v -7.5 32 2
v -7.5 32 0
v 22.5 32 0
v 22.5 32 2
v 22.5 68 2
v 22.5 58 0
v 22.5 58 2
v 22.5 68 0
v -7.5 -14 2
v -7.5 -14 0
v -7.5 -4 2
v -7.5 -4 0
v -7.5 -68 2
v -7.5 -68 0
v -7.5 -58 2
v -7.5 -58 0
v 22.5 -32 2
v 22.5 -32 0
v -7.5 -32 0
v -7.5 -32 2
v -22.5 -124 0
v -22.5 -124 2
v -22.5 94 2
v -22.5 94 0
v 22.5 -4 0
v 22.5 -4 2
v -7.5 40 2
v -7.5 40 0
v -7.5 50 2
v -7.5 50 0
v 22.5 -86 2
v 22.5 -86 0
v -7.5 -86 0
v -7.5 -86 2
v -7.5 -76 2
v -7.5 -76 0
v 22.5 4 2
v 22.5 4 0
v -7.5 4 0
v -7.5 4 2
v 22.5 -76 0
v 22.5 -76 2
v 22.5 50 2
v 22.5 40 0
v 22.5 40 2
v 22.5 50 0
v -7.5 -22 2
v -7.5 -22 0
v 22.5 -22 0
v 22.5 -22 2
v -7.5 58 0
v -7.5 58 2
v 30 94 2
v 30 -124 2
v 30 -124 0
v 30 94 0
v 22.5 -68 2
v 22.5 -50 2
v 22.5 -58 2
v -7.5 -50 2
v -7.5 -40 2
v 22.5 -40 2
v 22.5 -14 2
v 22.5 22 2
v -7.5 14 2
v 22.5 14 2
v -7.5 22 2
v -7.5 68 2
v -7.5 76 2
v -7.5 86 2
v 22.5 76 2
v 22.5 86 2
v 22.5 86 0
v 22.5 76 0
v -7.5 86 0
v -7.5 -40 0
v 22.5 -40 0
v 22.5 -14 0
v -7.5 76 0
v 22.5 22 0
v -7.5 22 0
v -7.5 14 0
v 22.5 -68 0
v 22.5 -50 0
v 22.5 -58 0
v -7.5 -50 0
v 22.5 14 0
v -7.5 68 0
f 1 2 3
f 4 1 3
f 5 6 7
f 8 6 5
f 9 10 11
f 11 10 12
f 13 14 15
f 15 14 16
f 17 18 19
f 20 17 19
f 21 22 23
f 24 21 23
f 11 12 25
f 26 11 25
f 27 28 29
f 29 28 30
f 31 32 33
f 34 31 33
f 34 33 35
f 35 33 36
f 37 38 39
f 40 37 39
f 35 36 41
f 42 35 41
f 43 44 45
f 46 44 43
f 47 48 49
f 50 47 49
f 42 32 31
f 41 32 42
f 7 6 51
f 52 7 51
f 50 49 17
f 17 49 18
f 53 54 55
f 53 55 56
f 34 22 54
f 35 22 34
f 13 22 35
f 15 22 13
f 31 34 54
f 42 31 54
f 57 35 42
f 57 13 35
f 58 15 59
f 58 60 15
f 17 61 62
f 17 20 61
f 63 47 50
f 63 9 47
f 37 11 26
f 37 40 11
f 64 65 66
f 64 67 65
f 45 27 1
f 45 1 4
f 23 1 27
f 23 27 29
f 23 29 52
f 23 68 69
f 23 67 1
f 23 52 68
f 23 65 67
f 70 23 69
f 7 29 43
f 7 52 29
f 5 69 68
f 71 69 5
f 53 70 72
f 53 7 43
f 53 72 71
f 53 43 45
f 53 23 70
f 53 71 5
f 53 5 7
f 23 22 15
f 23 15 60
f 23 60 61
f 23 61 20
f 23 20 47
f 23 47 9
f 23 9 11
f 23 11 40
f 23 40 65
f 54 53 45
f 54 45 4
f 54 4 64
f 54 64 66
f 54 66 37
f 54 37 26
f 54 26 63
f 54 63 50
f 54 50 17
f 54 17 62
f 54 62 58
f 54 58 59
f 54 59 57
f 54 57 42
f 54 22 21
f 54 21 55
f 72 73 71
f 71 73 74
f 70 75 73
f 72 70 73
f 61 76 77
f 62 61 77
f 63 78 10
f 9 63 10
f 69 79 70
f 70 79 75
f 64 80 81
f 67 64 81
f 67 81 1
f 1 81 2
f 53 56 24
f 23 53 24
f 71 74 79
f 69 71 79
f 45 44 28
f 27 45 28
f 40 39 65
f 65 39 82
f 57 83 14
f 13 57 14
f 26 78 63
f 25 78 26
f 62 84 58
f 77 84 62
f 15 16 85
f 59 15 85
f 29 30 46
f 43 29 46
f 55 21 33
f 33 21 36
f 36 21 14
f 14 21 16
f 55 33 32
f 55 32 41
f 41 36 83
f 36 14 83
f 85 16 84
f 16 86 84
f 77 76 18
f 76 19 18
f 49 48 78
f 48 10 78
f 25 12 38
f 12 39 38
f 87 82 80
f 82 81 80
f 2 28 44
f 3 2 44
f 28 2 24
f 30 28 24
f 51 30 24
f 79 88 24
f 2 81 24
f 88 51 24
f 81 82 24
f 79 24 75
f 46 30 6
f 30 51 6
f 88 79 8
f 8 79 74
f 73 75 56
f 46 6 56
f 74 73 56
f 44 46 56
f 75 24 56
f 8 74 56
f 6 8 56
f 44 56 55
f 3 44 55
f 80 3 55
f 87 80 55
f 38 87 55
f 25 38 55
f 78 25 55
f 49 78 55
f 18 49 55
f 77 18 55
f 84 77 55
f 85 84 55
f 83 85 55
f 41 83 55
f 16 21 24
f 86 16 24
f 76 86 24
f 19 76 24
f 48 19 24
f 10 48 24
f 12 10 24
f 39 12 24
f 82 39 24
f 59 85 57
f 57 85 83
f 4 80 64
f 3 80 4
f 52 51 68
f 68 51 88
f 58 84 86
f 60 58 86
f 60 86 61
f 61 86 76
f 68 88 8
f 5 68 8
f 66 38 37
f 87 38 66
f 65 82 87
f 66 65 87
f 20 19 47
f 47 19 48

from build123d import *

# Parameters (mm, degrees)
SKETCH2_W           = 15
SKETCH2_H           = 8
SKETCH2_W_2         = 30
SKETCH2_W_3         = 7.5
SKETCH2_H_2         = 10
BOSS_EXTRUDE1_DEPTH = 2
SKETCH3_W           = 52.5
SKETCH3_H           = 30
BOSS_EXTRUDE2_DEPTH = 2


with BuildPart() as part:
    # Sketch2 → Boss-Extrude1 (new body)
    with BuildSketch(Plane.XY):
        with Locations((-15, 90)):
            Rectangle(SKETCH2_W, SKETCH2_H)
        with Locations((7.5, 90)):
            Rectangle(SKETCH2_W_2, SKETCH2_H)
        with Locations((26.25, 90)):
            Rectangle(SKETCH2_W_3, SKETCH2_H)
        with Locations((26.25, 81)):
            Rectangle(SKETCH2_W_3, SKETCH2_H_2)
        with Locations((26.25, 72)):
            Rectangle(SKETCH2_W_3, SKETCH2_H)
        with Locations((7.5, 72)):
            Rectangle(SKETCH2_W_2, SKETCH2_H)
        with Locations((-15, 72)):
            Rectangle(SKETCH2_W, SKETCH2_H)
        with Locations((-15, 81)):
            Rectangle(SKETCH2_W, SKETCH2_H_2)
        with Locations((-15, 63)):
            Rectangle(SKETCH2_W, SKETCH2_H_2)
        with Locations((-15, 54)):
            Rectangle(SKETCH2_W, SKETCH2_H)
        with Locations((7.5, 54)):
            Rectangle(SKETCH2_W_2, SKETCH2_H)
        with Locations((26.25, 54)):
            Rectangle(SKETCH2_W_3, SKETCH2_H)
        with Locations((26.25, 63)):
            Rectangle(SKETCH2_W_3, SKETCH2_H_2)
        with Locations((-15, 45)):
            Rectangle(SKETCH2_W, SKETCH2_H_2)
        with Locations((-15, 36)):
            Rectangle(SKETCH2_W, SKETCH2_H)
        with Locations((-15, 27)):
            Rectangle(SKETCH2_W, SKETCH2_H_2)
        with Locations((-15, -90)):
            Rectangle(SKETCH2_W, SKETCH2_H)
        with Locations((7.5, -90)):
            Rectangle(SKETCH2_W_2, SKETCH2_H)
        with Locations((26.25, -90)):
            Rectangle(SKETCH2_W_3, SKETCH2_H)
        with Locations((26.25, -81)):
            Rectangle(SKETCH2_W_3, SKETCH2_H_2)
        with Locations((-15, -81)):
            Rectangle(SKETCH2_W, SKETCH2_H_2)
        with Locations((-15, -72)):
            Rectangle(SKETCH2_W, SKETCH2_H)
        with Locations((7.5, -72)):
            Rectangle(SKETCH2_W_2, SKETCH2_H)
        with Locations((26.25, -72)):
            Rectangle(SKETCH2_W_3, SKETCH2_H)
        with Locations((26.25, -63)):
            Rectangle(SKETCH2_W_3, SKETCH2_H_2)
        with Locations((26.25, -54)):
            Rectangle(SKETCH2_W_3, SKETCH2_H)
        with Locations((7.5, -54)):
            Rectangle(SKETCH2_W_2, SKETCH2_H)
        with Locations((-15, -54)):
            Rectangle(SKETCH2_W, SKETCH2_H)
        with Locations((-15, -63)):
            Rectangle(SKETCH2_W, SKETCH2_H_2)
        with Locations((-15, -45)):
            Rectangle(SKETCH2_W, SKETCH2_H_2)
        with Locations((-15, -36)):
            Rectangle(SKETCH2_W, SKETCH2_H)
        with Locations((-15, -27)):
            Rectangle(SKETCH2_W, SKETCH2_H_2)
        with Locations((-15, -18)):
            Rectangle(SKETCH2_W, SKETCH2_H)
        with Locations((-15, -9)):
            Rectangle(SKETCH2_W, SKETCH2_H_2)
        with Locations((7.5, -36)):
            Rectangle(SKETCH2_W_2, SKETCH2_H)
        with Locations((26.25, -36)):
            Rectangle(SKETCH2_W_3, SKETCH2_H)
        with Locations((26.25, -45)):
            Rectangle(SKETCH2_W_3, SKETCH2_H_2)
        with Locations((26.25, -27)):
            Rectangle(SKETCH2_W_3, SKETCH2_H_2)
        with Locations((26.25, -18)):
            Rectangle(SKETCH2_W_3, SKETCH2_H)
        with Locations((7.5, -18)):
            Rectangle(SKETCH2_W_2, SKETCH2_H)
        with Locations((26.25, -9)):
            Rectangle(SKETCH2_W_3, SKETCH2_H_2)
        with Locations((-15, 0)):
            Rectangle(SKETCH2_W, SKETCH2_H)
        with Locations((7.5, 0)):
            Rectangle(SKETCH2_W_2, SKETCH2_H)
        with Locations((26.25, 0)):
            Rectangle(SKETCH2_W_3, SKETCH2_H)
        with Locations((26.25, 9)):
            Rectangle(SKETCH2_W_3, SKETCH2_H_2)
        with Locations((-15, 9)):
            Rectangle(SKETCH2_W, SKETCH2_H_2)
        with Locations((-15, 18)):
            Rectangle(SKETCH2_W, SKETCH2_H)
        with Locations((7.5, 36)):
            Rectangle(SKETCH2_W_2, SKETCH2_H)
        with Locations((7.5, 18)):
            Rectangle(SKETCH2_W_2, SKETCH2_H)
        with Locations((26.25, 18)):
            Rectangle(SKETCH2_W_3, SKETCH2_H)
        with Locations((26.25, 27)):
            Rectangle(SKETCH2_W_3, SKETCH2_H_2)
        with Locations((26.25, 36)):
            Rectangle(SKETCH2_W_3, SKETCH2_H)
        with Locations((26.25, 45)):
            Rectangle(SKETCH2_W_3, SKETCH2_H_2)
    extrude(amount=BOSS_EXTRUDE1_DEPTH)

    # Sketch3 → Boss-Extrude2 (add)
    with BuildSketch(Plane.XY.offset(2)):
        with Locations((3.75, -109)):
            Rectangle(SKETCH3_W, SKETCH3_H)
    extrude(amount=-BOSS_EXTRUDE2_DEPTH)


solid = part.part
